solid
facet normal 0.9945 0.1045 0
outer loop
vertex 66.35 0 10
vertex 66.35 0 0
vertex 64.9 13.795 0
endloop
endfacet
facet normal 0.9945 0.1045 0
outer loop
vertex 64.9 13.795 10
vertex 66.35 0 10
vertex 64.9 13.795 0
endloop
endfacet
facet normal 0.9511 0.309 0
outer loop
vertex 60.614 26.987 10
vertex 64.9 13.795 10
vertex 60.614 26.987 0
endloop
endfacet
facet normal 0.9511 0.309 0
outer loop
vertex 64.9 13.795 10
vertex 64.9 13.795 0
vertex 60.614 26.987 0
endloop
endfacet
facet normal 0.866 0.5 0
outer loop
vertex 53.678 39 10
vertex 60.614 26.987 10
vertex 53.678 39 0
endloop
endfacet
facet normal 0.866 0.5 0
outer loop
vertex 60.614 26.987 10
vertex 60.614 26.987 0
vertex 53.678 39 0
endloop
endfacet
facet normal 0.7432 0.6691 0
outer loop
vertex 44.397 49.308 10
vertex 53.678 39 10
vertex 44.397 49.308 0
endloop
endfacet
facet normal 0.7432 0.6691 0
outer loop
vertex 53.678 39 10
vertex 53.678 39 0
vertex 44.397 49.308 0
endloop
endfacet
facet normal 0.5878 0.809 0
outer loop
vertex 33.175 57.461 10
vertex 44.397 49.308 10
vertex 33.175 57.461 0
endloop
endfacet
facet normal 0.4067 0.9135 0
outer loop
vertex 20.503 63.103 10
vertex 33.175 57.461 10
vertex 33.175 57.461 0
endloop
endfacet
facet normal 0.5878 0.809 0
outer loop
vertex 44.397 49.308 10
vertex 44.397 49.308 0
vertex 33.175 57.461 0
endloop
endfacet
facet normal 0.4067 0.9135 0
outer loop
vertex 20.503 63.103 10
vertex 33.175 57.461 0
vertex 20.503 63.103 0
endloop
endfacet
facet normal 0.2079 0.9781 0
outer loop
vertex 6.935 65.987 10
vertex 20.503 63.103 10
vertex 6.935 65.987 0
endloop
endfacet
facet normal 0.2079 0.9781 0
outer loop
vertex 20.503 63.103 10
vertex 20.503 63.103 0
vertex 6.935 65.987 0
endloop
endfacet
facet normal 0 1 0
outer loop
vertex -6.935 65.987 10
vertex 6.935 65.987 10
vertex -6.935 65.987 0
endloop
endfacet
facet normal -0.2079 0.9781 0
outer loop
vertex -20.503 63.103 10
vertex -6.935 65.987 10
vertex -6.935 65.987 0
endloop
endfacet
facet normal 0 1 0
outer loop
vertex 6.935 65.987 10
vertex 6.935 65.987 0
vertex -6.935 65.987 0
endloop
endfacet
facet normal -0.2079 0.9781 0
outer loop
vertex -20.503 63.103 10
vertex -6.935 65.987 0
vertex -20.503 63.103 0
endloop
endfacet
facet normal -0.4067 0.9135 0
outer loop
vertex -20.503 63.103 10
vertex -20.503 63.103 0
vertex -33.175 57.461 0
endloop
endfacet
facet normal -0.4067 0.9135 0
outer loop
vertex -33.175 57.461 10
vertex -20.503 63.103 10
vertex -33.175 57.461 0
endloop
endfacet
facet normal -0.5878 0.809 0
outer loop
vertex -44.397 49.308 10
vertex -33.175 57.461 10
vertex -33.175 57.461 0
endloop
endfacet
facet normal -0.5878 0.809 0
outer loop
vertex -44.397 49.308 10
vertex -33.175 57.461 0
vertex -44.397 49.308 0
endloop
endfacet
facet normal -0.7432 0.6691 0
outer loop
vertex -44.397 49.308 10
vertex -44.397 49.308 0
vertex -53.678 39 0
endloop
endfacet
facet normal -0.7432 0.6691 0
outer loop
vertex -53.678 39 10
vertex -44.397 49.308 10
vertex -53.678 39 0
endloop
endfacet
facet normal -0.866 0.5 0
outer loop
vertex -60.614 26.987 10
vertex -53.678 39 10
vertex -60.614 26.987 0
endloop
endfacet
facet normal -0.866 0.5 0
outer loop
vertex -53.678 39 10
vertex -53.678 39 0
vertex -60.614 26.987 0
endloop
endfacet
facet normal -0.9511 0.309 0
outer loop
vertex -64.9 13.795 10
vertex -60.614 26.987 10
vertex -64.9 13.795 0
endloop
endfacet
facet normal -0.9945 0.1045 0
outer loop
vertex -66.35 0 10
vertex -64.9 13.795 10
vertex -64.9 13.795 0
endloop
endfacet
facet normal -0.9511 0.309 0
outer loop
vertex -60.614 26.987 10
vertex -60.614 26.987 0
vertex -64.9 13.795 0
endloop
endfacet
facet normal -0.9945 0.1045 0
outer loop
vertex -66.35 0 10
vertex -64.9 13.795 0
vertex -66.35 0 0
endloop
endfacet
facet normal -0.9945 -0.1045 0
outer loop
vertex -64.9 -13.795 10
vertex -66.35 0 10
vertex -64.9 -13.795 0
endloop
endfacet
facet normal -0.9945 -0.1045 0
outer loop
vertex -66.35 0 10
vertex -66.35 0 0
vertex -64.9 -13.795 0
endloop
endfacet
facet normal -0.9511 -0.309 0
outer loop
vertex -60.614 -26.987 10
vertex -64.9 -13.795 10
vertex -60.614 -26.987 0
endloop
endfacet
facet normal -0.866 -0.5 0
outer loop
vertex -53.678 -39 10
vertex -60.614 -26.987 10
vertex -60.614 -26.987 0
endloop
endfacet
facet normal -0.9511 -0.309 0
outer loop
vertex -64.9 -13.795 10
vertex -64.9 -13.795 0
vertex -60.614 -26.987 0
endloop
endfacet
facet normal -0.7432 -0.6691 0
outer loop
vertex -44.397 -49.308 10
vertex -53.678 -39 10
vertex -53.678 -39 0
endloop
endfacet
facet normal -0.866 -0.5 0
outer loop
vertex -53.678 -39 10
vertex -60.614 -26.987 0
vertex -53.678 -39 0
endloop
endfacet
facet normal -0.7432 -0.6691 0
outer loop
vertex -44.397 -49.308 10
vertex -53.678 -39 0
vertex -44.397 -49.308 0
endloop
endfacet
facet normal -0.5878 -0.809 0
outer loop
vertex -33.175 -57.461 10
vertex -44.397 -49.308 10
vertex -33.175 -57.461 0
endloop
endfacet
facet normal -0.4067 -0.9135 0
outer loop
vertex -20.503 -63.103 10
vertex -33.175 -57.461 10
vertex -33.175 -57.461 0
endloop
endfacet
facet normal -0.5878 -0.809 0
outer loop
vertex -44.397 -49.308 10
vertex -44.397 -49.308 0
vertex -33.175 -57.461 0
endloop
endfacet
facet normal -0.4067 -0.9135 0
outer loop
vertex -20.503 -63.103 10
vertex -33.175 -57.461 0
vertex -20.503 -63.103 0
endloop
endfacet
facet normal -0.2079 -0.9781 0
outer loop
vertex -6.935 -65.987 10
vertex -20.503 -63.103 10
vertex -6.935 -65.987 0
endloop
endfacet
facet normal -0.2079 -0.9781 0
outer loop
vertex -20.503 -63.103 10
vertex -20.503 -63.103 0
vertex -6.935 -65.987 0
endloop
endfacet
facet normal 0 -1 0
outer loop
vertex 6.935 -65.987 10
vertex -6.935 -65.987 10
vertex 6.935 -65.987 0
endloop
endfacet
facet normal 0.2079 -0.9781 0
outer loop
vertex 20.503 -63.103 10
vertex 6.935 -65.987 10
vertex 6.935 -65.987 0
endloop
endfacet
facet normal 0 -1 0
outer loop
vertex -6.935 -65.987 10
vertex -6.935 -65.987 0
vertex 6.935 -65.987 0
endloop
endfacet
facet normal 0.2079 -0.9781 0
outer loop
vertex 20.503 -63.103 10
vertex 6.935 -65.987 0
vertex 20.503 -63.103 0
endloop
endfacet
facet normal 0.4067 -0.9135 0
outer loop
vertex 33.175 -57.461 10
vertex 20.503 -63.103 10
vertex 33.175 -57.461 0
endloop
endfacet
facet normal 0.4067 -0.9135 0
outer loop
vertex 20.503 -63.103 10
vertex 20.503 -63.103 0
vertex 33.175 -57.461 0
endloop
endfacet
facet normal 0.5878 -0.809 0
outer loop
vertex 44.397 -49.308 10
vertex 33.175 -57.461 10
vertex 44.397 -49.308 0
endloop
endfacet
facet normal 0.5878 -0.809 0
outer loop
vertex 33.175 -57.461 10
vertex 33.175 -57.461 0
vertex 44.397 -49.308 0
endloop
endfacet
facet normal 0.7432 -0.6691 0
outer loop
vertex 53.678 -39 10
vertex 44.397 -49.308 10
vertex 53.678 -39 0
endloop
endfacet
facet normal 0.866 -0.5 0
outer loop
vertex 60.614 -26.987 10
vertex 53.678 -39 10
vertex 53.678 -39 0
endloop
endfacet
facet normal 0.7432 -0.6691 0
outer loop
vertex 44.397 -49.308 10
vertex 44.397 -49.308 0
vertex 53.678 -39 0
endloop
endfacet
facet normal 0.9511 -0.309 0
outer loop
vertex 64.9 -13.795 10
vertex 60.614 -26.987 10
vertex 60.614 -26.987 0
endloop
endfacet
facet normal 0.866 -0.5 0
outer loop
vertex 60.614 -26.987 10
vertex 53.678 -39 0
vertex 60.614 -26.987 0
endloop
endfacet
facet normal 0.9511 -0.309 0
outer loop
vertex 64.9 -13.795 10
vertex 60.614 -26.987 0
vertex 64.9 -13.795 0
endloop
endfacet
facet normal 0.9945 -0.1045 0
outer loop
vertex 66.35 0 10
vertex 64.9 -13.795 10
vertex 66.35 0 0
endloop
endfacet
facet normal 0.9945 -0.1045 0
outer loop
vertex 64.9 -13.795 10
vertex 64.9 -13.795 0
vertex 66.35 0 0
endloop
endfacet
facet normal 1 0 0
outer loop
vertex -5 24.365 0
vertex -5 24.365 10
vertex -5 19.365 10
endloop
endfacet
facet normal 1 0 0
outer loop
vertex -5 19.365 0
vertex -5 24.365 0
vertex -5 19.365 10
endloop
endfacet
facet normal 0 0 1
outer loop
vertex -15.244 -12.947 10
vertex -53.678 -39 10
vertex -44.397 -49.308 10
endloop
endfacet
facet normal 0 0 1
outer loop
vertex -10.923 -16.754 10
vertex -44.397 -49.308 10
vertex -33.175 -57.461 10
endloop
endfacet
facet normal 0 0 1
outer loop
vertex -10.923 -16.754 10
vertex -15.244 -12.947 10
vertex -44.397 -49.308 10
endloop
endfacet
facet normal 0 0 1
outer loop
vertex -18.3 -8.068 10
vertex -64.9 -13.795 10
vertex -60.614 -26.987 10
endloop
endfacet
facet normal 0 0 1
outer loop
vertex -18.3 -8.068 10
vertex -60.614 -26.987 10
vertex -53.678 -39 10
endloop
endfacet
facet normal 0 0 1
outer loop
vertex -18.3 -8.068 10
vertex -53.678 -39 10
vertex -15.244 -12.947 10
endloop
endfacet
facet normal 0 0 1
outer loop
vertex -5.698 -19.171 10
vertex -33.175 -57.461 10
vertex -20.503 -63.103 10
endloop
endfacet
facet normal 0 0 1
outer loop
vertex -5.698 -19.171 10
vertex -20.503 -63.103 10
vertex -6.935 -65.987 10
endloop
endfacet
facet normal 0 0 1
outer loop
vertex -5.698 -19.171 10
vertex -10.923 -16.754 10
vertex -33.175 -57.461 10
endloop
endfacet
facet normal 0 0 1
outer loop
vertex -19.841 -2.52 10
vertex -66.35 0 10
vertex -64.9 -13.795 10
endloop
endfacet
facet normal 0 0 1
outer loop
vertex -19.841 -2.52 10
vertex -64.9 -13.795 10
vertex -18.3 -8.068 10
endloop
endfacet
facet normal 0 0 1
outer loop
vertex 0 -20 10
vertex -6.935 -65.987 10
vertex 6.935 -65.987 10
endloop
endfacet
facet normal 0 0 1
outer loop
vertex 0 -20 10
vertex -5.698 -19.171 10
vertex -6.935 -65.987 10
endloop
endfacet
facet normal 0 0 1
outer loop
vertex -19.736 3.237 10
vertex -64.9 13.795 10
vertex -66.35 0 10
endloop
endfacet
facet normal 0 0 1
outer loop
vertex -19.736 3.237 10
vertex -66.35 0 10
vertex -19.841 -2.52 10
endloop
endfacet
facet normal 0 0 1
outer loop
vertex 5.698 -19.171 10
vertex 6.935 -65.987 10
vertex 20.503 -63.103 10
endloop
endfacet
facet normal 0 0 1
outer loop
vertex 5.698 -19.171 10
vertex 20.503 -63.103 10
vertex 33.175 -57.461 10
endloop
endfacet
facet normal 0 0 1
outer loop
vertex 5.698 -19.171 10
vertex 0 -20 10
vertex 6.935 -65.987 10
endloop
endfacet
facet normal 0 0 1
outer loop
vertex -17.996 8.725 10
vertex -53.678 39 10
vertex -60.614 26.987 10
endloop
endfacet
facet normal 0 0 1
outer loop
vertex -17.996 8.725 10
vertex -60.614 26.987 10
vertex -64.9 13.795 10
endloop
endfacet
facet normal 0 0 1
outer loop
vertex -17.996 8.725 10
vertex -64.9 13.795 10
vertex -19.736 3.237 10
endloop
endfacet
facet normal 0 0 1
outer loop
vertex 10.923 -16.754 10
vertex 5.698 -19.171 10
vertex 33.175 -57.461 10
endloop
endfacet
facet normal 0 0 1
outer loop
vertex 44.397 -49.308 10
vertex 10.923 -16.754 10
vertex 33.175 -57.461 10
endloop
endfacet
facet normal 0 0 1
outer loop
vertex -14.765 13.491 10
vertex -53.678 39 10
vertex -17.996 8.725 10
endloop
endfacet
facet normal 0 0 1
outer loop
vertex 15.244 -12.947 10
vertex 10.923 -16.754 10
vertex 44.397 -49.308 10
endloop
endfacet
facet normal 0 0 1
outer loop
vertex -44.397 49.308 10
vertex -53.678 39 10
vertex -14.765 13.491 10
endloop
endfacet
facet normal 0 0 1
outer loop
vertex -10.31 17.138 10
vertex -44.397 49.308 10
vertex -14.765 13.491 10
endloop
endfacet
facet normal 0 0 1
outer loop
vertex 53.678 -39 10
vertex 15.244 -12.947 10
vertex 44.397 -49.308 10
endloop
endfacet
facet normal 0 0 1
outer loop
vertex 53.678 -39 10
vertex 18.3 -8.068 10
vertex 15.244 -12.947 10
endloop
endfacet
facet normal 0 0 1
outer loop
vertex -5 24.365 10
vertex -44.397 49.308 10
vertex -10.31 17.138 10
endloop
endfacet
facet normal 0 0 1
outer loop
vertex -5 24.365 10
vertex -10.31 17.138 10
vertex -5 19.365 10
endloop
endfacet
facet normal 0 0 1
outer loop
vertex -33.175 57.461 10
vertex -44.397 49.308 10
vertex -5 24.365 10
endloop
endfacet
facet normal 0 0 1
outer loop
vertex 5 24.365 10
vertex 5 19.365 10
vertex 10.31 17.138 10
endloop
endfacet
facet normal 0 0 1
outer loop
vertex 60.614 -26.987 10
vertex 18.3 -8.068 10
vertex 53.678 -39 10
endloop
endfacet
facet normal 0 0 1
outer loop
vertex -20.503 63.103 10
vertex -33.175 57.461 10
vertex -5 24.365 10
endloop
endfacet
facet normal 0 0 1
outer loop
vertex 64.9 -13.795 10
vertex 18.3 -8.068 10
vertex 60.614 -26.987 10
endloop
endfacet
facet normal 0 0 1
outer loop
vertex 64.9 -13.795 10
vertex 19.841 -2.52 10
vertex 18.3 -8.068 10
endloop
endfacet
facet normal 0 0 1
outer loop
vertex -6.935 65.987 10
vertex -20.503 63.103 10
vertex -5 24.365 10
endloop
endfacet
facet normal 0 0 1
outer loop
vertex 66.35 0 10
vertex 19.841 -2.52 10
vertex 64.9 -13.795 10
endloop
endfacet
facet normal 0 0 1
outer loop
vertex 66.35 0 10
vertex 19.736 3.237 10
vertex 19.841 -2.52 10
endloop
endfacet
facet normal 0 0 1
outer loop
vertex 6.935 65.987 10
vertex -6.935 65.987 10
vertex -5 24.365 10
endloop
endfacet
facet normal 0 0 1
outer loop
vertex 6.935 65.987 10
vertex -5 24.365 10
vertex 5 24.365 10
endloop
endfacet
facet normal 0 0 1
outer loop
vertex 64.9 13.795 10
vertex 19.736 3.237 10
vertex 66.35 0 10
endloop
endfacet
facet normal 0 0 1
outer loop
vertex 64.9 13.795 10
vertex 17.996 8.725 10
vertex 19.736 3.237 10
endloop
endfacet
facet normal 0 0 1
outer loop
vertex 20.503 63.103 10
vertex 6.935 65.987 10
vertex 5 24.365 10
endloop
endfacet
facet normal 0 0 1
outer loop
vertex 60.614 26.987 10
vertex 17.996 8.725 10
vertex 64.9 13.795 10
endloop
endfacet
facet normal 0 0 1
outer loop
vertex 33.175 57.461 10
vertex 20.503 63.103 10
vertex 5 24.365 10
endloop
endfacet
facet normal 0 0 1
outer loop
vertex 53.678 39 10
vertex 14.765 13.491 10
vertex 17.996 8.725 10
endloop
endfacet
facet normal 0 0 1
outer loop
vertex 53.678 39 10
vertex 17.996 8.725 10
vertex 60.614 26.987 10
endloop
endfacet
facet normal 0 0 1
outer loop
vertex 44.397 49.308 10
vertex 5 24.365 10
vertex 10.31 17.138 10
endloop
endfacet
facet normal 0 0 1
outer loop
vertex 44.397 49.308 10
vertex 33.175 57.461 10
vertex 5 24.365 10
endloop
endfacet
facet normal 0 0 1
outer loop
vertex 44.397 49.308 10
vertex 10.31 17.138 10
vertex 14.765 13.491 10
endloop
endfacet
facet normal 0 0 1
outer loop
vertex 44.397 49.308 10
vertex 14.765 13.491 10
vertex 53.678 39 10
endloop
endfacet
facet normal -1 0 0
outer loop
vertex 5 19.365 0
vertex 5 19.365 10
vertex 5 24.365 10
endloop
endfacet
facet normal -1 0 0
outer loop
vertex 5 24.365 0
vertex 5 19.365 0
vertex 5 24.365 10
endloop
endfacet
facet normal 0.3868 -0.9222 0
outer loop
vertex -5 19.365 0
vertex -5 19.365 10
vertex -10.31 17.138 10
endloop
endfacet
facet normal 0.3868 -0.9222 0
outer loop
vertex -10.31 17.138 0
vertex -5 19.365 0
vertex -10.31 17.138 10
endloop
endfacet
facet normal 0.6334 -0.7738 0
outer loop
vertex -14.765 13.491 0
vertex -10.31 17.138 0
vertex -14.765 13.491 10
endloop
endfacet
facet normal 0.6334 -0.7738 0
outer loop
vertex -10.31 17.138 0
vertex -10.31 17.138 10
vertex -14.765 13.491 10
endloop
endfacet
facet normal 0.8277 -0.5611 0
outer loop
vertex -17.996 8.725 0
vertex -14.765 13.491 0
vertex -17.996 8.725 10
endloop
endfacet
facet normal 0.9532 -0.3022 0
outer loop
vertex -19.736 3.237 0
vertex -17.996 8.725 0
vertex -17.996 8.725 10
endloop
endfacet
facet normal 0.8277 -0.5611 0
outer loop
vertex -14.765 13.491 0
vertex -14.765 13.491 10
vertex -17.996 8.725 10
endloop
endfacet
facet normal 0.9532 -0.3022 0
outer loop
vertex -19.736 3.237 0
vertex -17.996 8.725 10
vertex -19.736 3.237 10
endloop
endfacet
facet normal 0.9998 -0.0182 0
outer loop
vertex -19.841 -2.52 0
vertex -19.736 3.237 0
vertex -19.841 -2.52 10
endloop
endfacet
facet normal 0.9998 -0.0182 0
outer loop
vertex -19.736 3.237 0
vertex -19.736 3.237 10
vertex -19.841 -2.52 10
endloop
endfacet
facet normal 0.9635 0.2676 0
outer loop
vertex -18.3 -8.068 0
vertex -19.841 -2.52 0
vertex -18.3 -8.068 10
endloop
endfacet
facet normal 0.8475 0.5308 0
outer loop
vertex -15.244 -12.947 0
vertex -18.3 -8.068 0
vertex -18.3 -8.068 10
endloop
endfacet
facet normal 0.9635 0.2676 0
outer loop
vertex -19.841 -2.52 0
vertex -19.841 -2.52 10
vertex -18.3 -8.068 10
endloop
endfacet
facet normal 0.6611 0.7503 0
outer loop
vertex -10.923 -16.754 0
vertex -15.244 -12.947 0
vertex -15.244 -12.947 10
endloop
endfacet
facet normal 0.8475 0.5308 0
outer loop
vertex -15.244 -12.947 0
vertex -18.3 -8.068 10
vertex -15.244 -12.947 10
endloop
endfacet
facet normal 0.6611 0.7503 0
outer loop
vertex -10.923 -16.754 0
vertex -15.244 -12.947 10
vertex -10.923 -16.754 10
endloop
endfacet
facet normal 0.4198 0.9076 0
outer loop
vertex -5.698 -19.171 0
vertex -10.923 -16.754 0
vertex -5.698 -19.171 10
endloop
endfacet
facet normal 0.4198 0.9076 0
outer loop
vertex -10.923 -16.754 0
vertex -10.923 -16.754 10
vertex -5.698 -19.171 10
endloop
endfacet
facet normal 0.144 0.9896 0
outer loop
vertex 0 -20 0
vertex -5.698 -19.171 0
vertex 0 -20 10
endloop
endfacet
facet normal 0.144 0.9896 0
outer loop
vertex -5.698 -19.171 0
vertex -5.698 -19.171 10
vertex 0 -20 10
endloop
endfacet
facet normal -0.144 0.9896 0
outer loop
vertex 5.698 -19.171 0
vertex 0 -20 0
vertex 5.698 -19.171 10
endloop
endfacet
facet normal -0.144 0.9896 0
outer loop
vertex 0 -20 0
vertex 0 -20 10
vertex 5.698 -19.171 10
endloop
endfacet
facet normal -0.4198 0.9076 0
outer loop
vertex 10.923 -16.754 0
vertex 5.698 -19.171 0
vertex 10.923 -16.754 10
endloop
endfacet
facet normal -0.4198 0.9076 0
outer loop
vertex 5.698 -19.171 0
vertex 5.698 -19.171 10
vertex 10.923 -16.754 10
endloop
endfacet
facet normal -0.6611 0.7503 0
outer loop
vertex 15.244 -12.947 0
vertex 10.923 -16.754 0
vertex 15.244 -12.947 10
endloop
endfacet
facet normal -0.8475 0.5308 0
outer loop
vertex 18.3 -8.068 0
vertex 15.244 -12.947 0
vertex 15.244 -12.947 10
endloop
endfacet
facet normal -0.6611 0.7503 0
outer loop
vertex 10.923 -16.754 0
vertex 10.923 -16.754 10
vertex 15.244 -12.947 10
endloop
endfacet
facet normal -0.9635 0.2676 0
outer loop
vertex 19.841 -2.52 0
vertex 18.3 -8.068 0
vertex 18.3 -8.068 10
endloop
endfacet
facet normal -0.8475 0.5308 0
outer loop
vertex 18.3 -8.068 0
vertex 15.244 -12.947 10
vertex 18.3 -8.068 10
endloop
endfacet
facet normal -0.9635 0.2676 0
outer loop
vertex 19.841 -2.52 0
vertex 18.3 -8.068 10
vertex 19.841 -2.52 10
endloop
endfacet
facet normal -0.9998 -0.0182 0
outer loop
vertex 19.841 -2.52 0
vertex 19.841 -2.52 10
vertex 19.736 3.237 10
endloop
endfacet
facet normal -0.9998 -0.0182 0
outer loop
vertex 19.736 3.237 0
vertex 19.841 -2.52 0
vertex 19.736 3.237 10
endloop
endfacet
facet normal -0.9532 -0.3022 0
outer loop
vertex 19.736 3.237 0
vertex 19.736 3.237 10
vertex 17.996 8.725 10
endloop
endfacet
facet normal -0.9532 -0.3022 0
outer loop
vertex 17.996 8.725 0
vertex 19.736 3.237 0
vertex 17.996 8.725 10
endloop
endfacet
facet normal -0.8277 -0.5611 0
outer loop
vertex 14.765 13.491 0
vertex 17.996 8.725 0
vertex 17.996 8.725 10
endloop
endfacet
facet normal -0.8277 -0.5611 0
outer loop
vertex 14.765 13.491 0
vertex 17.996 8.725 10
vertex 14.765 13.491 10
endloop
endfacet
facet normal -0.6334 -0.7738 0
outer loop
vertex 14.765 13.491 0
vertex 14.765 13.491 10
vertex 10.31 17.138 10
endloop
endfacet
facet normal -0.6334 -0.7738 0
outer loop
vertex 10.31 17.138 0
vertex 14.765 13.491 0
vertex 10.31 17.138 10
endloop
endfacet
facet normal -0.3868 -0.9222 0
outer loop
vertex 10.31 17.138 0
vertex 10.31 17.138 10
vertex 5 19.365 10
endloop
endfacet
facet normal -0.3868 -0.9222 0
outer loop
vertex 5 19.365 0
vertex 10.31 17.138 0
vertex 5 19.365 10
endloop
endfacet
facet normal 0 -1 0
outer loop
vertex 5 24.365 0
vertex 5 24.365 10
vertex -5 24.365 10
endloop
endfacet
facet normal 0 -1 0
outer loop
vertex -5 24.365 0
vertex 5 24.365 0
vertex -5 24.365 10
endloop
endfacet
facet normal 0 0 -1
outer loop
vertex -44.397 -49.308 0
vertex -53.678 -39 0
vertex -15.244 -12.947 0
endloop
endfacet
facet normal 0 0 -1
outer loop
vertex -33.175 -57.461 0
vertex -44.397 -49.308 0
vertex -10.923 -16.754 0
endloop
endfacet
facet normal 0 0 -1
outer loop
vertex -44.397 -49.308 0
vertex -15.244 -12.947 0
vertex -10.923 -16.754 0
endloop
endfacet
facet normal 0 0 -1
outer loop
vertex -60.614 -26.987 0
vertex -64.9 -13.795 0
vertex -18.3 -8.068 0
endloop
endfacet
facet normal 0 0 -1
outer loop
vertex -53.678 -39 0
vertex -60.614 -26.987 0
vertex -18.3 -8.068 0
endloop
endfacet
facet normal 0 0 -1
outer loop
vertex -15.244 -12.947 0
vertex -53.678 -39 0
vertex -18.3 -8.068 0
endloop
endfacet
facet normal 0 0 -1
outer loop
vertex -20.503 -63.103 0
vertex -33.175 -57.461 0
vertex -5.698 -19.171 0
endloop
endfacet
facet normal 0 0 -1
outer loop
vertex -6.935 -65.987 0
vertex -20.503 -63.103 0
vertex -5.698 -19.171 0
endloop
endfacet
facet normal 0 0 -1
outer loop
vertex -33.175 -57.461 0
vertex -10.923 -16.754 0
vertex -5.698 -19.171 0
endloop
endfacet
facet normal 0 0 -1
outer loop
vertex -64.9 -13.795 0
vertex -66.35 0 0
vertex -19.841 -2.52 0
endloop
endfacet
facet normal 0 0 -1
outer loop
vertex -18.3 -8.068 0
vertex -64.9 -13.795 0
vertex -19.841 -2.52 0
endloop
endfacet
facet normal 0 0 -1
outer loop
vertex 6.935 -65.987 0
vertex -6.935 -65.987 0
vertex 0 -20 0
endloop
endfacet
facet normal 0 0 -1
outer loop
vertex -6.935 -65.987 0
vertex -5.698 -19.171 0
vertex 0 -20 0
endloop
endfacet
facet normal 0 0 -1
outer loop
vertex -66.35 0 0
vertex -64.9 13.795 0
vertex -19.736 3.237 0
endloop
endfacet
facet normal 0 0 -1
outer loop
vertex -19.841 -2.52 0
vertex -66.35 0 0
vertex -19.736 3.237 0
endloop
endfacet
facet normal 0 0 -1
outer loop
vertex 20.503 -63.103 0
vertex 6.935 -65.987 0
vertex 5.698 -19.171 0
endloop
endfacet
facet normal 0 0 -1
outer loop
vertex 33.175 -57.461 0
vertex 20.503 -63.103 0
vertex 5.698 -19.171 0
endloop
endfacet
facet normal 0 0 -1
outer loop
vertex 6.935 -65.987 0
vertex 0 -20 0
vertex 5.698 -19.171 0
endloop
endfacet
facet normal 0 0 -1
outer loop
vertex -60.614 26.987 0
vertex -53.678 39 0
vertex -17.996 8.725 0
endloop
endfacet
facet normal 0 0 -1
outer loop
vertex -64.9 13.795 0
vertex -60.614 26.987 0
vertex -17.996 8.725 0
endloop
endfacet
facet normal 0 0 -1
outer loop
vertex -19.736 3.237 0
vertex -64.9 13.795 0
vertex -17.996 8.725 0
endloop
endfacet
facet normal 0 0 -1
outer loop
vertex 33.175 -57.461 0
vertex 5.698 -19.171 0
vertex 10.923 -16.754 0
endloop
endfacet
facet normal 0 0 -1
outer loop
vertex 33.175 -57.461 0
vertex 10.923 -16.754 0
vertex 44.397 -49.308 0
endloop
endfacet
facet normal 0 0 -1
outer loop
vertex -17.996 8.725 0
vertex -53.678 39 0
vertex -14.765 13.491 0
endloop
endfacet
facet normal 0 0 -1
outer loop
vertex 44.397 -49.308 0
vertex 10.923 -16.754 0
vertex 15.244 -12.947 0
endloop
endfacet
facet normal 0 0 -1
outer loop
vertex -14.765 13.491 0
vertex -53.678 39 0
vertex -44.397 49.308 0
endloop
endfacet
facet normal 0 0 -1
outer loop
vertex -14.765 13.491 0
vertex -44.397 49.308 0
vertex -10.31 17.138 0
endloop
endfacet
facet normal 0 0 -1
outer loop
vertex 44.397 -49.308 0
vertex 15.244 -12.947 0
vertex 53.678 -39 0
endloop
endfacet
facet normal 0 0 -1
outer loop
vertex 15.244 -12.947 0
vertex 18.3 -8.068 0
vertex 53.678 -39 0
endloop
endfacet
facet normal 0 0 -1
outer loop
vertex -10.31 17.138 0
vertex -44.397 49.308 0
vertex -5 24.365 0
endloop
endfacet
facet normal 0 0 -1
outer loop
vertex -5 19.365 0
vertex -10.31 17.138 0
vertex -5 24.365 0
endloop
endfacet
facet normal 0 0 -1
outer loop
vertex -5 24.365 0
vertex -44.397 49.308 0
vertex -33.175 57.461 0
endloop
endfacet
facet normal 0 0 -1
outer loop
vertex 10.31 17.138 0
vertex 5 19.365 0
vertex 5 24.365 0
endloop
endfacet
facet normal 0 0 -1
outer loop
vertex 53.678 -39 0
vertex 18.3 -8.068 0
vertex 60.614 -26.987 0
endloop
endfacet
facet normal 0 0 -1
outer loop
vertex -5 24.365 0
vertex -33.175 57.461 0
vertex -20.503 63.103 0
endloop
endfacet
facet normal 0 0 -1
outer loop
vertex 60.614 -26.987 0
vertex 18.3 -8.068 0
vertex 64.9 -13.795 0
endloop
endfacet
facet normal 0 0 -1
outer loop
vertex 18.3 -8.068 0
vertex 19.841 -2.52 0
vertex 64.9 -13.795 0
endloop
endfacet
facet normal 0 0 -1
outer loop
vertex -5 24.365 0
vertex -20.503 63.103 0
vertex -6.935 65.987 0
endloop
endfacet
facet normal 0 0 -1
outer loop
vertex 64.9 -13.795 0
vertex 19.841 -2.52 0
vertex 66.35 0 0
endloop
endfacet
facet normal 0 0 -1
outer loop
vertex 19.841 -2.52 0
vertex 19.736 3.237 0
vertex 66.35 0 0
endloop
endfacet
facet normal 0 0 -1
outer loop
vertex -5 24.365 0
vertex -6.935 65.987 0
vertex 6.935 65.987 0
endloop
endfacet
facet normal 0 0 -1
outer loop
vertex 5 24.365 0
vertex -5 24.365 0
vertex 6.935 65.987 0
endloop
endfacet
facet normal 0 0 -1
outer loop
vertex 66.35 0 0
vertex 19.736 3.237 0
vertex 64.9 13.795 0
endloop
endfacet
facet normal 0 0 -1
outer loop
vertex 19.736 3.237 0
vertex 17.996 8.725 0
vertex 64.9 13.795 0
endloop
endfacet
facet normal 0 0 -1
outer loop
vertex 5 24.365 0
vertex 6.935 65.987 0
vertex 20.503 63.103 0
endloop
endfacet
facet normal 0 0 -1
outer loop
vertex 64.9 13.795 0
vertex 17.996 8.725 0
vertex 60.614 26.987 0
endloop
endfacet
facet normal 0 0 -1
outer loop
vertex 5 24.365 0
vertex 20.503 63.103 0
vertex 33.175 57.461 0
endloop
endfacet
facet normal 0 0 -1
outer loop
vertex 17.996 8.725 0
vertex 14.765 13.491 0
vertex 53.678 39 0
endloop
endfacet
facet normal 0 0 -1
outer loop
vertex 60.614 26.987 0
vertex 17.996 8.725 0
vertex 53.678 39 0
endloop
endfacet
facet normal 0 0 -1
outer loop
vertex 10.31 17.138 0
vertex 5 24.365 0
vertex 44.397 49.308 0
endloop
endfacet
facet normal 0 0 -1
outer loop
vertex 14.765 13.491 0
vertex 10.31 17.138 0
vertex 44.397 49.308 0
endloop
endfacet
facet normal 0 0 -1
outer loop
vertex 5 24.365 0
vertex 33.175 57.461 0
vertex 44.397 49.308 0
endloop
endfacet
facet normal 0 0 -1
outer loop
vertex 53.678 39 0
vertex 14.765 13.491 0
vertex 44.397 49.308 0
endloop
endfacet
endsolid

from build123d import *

# Parameters (mm, degrees)
SKETCH_R     = 66.350029
PAD_DEPTH    = 10
POCKET_DEPTH = 10.001


with BuildPart() as part:
    # Sketch → Pad (new body)
    with BuildSketch(Plane.XY):
        Circle(SKETCH_R)
    extrude(amount=PAD_DEPTH)

    # Sketch001 (on Face3 of Pad) → Pocket (cut, through all)
    with BuildSketch(Plane.XY.offset(10)):
        with BuildLine():
            ThreePointArc((-5, 19.364917), (0, -20), (5, 19.364917))
            Line((5, 19.364917), (5, 24.364917))
            Line((5, 24.364917), (-5, 24.364917))
            Line((-5, 24.364917), (-5, 19.364917))
        make_face()
    extrude(amount=-POCKET_DEPTH, mode=Mode.SUBTRACT)


solid = part.part
